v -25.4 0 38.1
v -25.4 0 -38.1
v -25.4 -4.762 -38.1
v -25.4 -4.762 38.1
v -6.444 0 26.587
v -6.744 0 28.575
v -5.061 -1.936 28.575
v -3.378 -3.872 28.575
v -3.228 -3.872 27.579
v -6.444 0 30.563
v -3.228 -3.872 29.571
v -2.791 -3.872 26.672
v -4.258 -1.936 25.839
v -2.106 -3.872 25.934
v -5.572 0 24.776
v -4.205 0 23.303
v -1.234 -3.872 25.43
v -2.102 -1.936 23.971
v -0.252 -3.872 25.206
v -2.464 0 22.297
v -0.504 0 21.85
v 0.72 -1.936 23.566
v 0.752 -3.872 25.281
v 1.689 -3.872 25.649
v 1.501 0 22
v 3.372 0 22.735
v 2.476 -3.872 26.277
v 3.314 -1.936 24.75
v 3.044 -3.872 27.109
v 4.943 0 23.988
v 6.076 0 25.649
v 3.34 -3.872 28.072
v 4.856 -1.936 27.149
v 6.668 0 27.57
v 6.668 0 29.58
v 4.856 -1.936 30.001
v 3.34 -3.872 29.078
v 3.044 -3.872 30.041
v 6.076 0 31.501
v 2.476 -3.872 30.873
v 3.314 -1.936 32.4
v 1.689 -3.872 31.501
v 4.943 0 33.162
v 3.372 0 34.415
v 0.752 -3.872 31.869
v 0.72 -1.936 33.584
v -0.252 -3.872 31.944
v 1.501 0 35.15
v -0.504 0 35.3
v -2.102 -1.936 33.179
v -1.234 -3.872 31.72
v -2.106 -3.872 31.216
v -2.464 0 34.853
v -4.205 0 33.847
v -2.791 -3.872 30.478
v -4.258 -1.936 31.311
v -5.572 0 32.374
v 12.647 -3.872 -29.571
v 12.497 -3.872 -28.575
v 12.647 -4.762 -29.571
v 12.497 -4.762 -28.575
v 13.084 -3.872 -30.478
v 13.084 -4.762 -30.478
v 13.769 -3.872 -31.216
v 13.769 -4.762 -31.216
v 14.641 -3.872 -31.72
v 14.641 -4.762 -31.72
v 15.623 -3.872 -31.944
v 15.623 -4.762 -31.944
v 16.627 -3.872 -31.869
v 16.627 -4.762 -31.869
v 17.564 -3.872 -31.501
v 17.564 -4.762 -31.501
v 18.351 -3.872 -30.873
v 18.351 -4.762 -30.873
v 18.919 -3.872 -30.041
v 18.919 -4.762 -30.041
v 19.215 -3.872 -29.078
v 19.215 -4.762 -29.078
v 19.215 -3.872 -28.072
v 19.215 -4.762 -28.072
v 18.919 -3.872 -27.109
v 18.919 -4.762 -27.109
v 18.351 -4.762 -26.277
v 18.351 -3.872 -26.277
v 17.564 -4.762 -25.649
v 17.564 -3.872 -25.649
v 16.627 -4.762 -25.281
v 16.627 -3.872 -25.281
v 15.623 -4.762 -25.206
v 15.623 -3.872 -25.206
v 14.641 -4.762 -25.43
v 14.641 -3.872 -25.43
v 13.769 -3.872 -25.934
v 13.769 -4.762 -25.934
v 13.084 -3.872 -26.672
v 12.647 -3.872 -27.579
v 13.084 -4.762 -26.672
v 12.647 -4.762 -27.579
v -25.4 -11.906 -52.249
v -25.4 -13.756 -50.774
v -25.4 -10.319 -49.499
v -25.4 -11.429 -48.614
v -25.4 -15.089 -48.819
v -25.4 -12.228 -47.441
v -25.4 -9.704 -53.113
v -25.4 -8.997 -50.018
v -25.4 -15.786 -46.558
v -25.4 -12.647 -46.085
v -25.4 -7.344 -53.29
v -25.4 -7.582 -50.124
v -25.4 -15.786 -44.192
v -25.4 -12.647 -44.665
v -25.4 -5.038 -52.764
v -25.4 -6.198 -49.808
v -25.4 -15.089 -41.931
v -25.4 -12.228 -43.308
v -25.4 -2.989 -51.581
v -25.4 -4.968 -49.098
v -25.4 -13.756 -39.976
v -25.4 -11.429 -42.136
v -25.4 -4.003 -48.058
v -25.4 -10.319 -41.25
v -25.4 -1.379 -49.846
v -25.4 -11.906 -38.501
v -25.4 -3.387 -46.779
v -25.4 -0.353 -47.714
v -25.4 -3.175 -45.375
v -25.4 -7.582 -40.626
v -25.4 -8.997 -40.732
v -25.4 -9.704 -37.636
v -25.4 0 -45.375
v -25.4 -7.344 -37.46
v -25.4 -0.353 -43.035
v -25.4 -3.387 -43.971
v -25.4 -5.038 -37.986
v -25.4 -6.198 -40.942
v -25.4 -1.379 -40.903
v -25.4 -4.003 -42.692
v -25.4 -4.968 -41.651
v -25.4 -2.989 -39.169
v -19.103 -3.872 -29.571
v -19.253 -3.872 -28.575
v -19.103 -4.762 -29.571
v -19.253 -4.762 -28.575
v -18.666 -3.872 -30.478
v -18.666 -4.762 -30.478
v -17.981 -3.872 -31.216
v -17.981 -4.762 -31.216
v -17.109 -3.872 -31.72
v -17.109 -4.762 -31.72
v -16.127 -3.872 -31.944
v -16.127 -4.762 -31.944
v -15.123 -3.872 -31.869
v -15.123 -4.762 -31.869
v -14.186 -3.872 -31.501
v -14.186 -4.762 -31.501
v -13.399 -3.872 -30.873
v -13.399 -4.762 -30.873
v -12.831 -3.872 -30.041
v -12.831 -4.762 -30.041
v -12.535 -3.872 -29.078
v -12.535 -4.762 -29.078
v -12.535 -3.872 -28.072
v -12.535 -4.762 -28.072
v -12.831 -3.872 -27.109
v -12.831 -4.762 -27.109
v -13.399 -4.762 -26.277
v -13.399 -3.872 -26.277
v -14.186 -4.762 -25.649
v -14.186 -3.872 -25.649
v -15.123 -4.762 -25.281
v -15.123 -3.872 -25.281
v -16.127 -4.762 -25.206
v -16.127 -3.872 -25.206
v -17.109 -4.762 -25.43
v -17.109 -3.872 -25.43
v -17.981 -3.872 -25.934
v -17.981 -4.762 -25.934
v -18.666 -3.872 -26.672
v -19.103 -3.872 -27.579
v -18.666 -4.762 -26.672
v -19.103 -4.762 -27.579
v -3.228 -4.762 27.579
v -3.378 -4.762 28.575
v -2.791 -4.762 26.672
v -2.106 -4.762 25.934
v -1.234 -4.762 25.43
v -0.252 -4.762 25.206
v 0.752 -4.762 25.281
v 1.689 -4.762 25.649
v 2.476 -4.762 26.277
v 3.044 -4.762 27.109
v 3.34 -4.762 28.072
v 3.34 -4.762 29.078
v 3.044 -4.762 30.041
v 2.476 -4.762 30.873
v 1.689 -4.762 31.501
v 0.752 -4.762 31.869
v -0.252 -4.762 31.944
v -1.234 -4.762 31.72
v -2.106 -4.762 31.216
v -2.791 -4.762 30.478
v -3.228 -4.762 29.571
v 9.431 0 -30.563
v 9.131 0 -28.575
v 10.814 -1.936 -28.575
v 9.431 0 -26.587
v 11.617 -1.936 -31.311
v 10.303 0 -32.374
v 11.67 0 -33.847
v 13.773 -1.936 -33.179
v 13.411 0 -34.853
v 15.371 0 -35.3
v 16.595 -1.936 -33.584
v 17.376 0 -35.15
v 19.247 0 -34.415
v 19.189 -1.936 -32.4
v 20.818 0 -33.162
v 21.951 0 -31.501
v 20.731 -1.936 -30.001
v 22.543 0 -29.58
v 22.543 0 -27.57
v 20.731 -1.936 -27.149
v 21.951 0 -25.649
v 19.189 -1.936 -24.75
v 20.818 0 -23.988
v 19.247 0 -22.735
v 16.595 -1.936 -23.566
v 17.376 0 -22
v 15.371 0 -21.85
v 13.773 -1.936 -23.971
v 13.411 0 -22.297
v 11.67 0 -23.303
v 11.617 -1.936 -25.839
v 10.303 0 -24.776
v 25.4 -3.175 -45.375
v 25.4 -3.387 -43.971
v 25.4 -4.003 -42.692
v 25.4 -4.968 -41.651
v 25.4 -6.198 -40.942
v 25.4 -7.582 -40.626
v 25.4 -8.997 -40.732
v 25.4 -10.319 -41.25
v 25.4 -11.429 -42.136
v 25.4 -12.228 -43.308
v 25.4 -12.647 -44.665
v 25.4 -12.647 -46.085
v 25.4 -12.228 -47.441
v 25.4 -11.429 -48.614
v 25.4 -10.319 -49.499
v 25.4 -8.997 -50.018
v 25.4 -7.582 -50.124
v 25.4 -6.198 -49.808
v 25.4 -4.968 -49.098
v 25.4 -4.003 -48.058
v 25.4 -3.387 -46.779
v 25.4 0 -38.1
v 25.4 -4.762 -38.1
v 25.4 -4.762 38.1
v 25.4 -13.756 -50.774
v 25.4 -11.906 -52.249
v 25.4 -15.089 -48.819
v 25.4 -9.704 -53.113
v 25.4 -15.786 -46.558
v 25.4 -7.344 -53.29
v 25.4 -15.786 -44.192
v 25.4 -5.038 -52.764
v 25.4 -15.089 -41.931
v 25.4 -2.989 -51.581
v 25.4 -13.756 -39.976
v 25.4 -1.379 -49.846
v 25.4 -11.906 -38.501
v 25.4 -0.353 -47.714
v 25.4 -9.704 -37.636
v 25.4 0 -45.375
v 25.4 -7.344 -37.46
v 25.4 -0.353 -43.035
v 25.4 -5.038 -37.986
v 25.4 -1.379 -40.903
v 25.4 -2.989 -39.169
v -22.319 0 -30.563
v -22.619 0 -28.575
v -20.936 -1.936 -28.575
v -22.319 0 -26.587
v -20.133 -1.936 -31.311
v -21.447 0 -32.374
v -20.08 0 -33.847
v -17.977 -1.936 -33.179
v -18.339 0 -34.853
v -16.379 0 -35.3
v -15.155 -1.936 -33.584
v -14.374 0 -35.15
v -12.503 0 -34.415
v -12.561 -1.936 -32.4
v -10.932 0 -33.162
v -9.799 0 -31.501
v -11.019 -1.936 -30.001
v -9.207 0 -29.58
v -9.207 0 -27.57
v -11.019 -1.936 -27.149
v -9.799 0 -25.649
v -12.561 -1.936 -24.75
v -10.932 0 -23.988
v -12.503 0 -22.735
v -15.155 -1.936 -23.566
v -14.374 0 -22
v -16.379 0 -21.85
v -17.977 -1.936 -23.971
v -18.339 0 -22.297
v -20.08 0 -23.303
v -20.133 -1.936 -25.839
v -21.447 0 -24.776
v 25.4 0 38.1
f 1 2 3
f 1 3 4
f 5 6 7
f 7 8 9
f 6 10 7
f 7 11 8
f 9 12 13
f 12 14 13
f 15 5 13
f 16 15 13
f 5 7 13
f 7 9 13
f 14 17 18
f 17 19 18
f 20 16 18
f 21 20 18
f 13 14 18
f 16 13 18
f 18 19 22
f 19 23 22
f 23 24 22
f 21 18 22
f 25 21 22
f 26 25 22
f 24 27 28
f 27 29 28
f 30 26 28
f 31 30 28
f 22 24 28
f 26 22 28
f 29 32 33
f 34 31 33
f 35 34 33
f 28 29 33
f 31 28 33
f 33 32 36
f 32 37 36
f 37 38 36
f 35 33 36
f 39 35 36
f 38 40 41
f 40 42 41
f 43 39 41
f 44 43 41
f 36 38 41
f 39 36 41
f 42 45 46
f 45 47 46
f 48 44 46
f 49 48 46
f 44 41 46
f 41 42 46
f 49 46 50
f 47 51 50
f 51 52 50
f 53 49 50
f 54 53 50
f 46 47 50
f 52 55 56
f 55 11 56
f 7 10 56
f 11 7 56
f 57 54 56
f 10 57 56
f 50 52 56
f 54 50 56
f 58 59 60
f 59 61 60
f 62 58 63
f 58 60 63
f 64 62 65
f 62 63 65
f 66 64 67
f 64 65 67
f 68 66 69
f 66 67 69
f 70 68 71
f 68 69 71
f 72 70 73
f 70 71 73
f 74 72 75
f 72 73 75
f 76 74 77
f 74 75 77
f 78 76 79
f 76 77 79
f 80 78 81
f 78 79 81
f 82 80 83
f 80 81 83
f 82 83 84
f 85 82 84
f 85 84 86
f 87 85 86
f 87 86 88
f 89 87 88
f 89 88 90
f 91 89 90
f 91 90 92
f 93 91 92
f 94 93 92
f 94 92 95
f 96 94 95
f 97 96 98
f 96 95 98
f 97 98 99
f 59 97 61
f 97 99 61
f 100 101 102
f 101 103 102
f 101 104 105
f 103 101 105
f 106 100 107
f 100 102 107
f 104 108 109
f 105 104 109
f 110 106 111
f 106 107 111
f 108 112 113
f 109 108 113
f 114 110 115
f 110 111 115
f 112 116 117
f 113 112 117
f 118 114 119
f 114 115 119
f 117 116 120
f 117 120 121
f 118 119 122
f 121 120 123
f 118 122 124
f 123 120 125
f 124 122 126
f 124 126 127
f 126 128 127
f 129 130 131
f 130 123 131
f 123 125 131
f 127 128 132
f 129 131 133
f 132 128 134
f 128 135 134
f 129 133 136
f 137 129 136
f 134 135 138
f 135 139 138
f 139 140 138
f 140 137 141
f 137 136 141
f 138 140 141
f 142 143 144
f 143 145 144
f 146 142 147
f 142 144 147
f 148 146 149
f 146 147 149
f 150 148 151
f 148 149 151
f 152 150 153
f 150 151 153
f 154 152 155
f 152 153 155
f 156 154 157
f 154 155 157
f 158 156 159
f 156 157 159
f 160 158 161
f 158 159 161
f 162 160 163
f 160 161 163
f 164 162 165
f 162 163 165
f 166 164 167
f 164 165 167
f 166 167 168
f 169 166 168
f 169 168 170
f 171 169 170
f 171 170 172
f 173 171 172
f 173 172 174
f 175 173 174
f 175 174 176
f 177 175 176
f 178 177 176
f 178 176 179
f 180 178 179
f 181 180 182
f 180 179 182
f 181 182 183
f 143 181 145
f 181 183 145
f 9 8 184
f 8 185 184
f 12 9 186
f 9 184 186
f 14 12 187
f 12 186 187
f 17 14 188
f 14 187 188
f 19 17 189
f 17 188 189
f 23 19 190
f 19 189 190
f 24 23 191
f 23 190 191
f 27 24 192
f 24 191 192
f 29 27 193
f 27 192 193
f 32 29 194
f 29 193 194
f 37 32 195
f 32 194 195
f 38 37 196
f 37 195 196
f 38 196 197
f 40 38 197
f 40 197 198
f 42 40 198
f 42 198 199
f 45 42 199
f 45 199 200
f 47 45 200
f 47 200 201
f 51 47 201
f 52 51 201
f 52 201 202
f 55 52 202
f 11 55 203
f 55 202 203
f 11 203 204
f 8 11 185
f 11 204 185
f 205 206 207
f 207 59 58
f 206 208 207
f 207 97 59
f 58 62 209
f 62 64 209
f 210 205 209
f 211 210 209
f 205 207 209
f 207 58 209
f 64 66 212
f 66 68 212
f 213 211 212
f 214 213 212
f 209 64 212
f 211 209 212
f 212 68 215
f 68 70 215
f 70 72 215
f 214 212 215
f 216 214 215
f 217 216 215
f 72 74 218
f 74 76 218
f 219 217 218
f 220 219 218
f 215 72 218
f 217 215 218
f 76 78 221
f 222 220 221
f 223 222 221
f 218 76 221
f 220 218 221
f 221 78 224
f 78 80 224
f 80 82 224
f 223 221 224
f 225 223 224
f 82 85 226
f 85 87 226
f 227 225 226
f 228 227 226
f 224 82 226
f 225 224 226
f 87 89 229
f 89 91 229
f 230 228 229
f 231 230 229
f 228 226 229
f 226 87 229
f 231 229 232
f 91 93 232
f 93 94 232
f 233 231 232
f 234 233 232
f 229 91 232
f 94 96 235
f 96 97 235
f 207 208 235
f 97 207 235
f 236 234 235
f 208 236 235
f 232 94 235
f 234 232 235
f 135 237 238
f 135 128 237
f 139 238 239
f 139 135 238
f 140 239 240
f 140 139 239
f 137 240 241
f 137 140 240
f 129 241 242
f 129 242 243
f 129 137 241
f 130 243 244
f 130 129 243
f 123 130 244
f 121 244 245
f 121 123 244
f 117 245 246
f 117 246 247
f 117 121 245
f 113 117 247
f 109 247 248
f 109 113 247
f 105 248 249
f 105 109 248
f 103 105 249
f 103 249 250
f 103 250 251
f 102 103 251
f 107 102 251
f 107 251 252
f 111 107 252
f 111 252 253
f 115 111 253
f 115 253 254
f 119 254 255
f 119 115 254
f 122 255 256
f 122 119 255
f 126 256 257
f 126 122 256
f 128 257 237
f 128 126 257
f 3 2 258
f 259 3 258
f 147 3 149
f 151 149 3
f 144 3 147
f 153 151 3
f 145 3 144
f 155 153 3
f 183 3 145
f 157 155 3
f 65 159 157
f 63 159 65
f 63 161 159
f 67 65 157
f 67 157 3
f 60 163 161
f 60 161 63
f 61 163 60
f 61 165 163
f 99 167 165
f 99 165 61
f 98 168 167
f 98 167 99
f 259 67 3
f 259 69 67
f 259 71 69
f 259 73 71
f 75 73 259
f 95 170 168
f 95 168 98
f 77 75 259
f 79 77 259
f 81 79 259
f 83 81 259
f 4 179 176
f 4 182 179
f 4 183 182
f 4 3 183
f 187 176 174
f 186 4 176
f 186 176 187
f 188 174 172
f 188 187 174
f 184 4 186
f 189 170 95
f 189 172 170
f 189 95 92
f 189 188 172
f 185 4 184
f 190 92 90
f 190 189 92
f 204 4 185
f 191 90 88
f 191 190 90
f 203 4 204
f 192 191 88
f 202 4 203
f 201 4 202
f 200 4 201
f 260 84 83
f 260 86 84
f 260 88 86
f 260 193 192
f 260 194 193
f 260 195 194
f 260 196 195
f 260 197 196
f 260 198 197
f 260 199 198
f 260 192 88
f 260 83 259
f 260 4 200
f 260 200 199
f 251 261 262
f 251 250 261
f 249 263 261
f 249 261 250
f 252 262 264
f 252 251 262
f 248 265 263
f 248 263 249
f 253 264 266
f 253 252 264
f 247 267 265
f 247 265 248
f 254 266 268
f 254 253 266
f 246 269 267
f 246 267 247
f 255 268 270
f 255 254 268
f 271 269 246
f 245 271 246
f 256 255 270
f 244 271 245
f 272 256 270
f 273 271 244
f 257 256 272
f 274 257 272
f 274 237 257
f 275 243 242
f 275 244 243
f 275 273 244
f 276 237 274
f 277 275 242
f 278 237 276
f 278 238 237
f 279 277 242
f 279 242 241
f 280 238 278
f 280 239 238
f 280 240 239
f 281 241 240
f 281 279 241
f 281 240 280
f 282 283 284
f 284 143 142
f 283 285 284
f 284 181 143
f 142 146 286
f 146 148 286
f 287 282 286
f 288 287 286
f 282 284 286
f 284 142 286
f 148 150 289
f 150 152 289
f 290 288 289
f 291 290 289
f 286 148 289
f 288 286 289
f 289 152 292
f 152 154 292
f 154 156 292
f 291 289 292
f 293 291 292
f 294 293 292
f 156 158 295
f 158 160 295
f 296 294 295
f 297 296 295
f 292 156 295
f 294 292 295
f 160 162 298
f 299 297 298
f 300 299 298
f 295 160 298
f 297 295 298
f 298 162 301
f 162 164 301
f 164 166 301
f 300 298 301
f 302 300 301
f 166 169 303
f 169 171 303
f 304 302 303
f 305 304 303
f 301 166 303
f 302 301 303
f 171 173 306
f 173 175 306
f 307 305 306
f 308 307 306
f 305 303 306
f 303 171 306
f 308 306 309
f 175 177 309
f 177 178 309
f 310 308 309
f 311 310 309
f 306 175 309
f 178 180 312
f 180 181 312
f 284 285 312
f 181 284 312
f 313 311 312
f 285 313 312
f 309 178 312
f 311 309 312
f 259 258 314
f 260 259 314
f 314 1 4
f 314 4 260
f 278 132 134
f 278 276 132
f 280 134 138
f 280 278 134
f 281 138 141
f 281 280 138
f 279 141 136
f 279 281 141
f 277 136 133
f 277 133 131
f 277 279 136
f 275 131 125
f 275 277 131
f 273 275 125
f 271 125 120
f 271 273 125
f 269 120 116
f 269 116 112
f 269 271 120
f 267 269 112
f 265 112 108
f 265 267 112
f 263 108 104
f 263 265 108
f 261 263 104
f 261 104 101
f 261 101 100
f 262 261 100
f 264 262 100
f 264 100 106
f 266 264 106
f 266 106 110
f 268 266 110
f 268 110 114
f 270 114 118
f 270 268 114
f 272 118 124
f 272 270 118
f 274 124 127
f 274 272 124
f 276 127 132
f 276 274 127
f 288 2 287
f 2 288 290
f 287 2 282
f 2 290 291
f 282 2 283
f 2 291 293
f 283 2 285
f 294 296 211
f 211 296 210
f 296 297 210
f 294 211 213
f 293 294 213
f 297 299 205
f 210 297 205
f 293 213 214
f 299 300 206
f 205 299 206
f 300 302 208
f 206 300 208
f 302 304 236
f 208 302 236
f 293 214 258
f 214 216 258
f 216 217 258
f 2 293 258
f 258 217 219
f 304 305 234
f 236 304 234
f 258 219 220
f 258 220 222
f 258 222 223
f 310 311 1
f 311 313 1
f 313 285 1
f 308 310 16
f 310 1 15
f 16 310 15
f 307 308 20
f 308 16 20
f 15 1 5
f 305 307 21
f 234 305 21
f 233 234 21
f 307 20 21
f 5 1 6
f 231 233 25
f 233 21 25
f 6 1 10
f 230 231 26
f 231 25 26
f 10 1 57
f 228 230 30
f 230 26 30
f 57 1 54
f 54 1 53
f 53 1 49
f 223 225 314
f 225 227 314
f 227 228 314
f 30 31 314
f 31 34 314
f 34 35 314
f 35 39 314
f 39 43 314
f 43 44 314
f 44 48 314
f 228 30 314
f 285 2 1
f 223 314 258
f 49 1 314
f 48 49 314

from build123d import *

# Parameters (mm, degrees)
F0_W           = 50.8
F0_H           = 76.2
F0_R           = 3.429
F1_DEPTH       = 4.7625
F2_D           = 6.7564
F2_CSINK_D     = 13.4874
F2_CSINK_ANGLE = 82
F3_R           = 7.9375
F3_R_2         = 4.7625
F4_DEPTH       = 25.4


with BuildPart() as f1:
    # F0 (on Front) → F1 (new body)
    with BuildSketch(Plane.XZ):
        Rectangle(F0_W, F0_H)
        with Locations((-15.875, -28.575)):
            Circle(F0_R, mode=Mode.SUBTRACT)
        with Locations((15.875, -28.575)):
            Circle(F0_R, mode=Mode.SUBTRACT)
        with Locations((0, 28.575)):
            Circle(F0_R, mode=Mode.SUBTRACT)
        with Locations((0, 28.575)):
            Circle(F0_R)
        with Locations((-15.875, -28.575)):
            Circle(F0_R)
        with Locations((15.875, -28.575)):
            Circle(F0_R)
    extrude(amount=F1_DEPTH)

    # F2 (through all)
    with Locations(Plane(origin=(0, 0, 0), x_dir=(1, 0, 0), z_dir=(0, 1, 0))):
        with Locations((0, -28.575), (-15.875, 28.575), (15.875, 28.575)):
            CounterSinkHole(F2_D / 2, F2_CSINK_D / 2, counter_sink_angle=F2_CSINK_ANGLE)


with BuildPart() as f4:
    # F3 (on Right) → F4 (new body, symmetric)
    with BuildSketch(Plane.YZ):
        with Locations((-7.9375, -45.3748389157)):
            Circle(F3_R)
        with Locations((-7.9375, -45.3748389157)):
            Circle(F3_R_2, mode=Mode.SUBTRACT)
    extrude(amount=F4_DEPTH, both=True)


solid = Compound([f1.part, f4.part])
